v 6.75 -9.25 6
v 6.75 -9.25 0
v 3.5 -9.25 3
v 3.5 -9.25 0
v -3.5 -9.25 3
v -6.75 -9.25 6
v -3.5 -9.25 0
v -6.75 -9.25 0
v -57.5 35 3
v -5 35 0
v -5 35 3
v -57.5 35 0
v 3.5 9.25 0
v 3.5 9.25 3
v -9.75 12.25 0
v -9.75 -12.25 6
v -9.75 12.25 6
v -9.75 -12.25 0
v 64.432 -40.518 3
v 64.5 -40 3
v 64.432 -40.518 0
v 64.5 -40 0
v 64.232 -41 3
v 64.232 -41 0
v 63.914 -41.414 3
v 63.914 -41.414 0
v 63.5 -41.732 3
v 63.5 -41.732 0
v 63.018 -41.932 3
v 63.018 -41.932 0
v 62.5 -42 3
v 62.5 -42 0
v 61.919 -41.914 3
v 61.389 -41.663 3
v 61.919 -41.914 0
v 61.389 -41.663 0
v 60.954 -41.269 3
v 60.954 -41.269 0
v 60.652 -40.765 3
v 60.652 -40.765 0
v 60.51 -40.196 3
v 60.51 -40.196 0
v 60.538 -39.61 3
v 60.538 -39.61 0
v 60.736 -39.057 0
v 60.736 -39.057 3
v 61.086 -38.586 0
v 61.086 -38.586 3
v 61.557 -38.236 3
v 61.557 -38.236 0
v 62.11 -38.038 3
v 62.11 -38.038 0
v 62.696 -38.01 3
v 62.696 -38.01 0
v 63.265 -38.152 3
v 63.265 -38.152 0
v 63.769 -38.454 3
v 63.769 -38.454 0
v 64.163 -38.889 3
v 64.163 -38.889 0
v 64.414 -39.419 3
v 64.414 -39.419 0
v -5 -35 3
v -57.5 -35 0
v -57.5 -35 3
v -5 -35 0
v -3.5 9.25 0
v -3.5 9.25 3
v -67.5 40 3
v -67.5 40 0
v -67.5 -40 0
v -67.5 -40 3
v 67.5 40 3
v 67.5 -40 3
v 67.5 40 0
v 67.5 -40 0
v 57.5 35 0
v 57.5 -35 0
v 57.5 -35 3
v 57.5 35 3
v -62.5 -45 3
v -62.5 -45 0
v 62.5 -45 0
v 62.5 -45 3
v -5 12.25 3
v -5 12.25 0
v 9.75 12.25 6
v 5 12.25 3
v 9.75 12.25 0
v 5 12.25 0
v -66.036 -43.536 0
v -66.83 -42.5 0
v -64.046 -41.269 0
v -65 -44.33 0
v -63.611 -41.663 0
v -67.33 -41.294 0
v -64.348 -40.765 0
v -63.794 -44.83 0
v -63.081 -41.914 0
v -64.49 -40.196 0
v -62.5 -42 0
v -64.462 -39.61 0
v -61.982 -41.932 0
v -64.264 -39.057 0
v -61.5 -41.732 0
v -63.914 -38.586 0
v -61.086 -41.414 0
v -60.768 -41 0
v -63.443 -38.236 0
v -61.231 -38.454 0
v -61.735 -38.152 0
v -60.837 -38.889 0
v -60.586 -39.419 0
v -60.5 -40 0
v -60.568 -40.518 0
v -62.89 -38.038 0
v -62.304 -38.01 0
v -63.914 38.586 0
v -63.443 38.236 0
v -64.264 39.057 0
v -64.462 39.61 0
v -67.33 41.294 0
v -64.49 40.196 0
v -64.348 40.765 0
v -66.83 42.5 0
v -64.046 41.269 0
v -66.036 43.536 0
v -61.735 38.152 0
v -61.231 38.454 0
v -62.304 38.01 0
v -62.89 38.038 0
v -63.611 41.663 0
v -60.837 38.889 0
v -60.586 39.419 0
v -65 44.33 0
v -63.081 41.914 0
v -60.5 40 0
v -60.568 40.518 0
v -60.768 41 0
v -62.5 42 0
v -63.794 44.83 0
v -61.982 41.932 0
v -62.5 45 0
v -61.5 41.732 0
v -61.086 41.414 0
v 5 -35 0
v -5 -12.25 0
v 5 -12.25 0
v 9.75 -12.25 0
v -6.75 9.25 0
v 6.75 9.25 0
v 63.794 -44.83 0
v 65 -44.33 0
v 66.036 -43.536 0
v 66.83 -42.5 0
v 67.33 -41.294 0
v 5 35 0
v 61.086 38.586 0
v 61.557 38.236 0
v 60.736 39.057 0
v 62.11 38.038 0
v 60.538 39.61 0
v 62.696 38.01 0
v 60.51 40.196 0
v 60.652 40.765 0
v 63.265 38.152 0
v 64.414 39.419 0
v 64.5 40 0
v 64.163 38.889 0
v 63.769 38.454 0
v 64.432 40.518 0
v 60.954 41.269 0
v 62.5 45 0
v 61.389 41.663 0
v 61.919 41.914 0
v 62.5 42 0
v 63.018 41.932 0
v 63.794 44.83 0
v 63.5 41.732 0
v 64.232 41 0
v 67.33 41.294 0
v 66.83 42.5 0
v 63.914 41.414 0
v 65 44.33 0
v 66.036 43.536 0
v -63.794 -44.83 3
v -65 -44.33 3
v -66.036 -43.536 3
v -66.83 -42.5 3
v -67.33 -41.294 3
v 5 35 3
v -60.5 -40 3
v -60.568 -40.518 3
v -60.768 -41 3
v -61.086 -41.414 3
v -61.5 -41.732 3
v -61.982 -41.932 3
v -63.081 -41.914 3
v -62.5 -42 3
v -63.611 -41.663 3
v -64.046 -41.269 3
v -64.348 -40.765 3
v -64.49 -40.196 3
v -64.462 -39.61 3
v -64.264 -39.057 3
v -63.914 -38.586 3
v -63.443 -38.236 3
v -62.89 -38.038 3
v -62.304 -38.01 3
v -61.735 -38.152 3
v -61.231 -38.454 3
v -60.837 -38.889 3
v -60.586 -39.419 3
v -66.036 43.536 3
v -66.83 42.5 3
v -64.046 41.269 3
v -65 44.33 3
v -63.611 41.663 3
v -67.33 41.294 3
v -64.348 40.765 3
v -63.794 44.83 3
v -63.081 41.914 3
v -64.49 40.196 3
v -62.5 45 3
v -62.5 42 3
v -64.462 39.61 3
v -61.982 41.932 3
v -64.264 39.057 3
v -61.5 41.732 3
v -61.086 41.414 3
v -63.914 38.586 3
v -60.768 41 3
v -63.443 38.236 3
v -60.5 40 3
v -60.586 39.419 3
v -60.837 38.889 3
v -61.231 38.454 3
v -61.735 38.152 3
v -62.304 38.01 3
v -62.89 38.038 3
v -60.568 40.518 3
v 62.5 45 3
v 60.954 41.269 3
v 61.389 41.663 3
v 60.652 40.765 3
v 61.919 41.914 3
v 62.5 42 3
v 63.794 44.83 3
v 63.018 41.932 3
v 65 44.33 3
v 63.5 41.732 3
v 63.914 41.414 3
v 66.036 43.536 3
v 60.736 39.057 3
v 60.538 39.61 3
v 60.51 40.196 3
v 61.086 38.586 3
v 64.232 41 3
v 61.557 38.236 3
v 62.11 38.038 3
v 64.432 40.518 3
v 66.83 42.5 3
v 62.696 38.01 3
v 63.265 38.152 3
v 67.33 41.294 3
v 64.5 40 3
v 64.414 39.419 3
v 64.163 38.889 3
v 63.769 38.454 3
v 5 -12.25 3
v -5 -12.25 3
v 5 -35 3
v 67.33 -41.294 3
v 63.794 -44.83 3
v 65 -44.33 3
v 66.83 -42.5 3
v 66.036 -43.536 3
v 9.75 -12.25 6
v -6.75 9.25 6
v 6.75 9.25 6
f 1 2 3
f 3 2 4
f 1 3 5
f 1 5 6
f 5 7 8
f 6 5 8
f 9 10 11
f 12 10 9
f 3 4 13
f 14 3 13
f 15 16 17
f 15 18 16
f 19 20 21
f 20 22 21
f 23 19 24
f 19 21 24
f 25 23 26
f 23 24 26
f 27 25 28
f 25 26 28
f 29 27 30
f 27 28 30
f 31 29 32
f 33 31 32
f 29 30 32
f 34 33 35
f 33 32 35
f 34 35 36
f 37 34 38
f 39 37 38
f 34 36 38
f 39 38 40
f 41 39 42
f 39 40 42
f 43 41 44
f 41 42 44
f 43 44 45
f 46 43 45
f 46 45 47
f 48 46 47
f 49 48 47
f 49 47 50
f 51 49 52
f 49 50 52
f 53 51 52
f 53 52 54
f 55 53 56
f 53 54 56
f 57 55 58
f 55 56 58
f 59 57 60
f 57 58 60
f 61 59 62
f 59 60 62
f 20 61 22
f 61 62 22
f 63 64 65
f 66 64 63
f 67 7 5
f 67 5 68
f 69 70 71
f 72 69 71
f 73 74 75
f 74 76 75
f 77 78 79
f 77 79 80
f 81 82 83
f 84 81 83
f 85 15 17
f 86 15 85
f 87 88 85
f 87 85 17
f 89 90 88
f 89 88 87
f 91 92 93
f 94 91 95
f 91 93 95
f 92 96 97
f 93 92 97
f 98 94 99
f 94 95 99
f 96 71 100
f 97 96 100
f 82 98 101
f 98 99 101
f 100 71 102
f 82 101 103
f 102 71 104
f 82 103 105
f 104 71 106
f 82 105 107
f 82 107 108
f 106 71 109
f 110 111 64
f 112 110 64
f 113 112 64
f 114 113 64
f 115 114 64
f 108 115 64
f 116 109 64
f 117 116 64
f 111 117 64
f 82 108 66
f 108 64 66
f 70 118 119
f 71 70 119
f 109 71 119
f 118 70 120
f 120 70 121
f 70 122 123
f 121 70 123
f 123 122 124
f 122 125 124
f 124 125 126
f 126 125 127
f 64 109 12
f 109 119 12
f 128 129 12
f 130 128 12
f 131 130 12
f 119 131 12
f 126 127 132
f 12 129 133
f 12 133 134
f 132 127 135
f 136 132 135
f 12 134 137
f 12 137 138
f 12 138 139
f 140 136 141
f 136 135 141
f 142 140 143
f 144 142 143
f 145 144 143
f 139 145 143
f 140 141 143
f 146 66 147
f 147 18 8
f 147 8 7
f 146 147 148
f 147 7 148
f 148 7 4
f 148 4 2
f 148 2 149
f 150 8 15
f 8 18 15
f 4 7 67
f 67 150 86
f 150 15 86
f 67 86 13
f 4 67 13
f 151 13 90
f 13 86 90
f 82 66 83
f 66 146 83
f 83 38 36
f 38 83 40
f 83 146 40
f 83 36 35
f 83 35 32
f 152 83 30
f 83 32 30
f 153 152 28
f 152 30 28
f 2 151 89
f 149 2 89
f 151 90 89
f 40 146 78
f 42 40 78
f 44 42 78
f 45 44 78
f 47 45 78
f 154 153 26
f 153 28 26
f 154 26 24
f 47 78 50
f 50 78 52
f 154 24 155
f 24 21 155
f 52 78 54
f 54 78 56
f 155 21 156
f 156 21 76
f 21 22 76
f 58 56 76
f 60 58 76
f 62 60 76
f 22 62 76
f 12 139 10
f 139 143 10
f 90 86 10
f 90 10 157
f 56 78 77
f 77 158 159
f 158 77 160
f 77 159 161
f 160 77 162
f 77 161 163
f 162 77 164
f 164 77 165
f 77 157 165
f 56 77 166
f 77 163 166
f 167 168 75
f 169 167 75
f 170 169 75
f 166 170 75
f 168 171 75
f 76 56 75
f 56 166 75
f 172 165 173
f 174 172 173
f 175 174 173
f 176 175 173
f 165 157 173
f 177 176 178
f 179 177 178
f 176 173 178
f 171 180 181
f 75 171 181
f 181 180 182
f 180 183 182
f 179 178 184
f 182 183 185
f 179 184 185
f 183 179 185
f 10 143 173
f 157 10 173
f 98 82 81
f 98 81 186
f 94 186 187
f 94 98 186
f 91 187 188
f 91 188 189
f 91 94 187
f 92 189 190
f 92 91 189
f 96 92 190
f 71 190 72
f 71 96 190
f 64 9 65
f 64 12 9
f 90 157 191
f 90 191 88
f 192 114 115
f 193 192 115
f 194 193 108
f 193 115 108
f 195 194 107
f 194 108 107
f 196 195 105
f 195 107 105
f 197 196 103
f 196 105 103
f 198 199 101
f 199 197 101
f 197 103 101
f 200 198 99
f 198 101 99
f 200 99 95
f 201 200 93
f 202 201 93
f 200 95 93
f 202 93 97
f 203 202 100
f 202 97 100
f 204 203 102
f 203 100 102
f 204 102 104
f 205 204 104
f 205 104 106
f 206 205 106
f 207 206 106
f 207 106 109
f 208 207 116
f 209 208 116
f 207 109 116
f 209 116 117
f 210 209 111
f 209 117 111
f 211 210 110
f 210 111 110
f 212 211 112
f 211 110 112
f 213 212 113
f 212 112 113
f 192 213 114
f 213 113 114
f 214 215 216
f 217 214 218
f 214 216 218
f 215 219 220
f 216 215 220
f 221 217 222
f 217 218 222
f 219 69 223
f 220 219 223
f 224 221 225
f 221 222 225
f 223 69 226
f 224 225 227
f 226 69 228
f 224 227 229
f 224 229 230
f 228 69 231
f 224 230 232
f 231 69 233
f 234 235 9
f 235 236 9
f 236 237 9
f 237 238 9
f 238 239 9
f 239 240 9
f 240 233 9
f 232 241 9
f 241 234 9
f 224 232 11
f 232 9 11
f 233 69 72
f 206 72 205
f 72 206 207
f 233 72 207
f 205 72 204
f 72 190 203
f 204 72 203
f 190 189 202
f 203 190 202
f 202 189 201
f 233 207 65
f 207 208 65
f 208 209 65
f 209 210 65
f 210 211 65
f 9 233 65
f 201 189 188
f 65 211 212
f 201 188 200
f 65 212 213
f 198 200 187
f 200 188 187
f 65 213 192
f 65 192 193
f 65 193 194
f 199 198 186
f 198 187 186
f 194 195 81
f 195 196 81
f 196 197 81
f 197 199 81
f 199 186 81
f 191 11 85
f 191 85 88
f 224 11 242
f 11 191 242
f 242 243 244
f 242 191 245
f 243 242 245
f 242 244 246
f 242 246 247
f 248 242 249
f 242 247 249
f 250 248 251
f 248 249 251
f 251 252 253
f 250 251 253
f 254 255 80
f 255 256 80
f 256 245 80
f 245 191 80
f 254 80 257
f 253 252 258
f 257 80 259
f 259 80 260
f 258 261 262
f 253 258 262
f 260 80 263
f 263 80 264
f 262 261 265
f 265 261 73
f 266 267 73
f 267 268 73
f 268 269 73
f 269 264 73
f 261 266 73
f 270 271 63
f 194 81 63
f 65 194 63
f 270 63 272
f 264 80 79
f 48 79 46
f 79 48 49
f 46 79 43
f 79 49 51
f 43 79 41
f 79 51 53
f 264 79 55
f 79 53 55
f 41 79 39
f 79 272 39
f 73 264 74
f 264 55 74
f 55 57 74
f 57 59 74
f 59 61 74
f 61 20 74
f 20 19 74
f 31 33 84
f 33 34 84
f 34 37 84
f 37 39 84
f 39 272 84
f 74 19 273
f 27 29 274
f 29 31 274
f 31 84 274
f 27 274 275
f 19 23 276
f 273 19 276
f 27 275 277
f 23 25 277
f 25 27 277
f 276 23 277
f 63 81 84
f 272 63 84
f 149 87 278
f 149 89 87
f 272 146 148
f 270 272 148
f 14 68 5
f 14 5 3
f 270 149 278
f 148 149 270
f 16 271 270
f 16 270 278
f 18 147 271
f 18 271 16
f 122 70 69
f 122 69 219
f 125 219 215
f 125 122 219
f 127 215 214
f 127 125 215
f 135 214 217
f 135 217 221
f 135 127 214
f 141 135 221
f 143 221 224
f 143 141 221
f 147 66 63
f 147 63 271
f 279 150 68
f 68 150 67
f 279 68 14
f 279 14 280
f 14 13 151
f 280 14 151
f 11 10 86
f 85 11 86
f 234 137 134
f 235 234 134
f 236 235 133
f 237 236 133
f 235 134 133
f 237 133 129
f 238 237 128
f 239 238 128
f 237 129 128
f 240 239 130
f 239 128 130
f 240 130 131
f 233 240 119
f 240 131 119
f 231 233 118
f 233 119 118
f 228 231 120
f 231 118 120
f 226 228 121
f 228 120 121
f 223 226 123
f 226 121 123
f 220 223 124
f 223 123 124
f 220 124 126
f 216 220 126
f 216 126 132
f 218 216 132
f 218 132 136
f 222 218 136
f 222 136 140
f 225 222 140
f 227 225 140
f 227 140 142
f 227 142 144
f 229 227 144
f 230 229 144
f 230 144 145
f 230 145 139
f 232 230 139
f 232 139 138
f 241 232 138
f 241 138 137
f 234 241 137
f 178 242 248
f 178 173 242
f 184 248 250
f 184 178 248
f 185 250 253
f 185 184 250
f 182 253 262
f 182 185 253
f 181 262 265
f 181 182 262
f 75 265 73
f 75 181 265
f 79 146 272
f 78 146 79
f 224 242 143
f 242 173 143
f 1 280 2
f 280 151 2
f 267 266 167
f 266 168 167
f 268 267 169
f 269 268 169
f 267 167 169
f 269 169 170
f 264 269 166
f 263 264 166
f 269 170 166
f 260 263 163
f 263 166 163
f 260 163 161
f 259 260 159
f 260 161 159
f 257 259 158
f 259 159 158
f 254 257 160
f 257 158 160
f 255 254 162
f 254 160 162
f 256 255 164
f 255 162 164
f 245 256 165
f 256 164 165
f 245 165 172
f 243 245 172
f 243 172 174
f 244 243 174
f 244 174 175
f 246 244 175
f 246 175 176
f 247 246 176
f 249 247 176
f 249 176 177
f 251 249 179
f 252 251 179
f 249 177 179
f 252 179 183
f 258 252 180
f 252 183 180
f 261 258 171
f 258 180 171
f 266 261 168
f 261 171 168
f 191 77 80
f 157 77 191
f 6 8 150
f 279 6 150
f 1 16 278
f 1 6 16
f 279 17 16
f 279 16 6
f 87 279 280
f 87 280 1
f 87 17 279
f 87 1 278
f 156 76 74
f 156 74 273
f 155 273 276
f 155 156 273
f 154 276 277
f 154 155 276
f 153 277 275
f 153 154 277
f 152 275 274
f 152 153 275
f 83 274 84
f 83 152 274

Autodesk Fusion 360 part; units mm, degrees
sketch "Boceto1" plane through (0, 0, 0) normal (0, 0, 1) x (1, 0, 0)
  line L0 (-6.75, 9.25) -> (6.75, 9.25)
  line L1 (6.75, 9.25) -> (6.75, -9.25)
  line L2 (6.75, -9.25) -> (-6.75, -9.25)
  line L3 (-6.75, -9.25) -> (-6.75, 9.25)
  line L4 (-6.75, 9.25) -> (6.75, -9.25) construction
  line L5 (6.75, 9.25) -> (-6.75, -9.25) construction
  line L6 (9.75, -12.25) -> (-9.75, -12.25)
  line L7 (-9.75, -12.25) -> (-9.75, 12.25)
  line L8 (-9.75, 12.25) -> (9.75, 12.25)
  line L9 (9.75, 12.25) -> (9.75, -12.25)
  line L10 (6.75, 0) -> (3.75, 0) construction
  line L11 (-6.75, 0) -> (-3.75, 0) construction
  line L12 (3.5, 0) -> (-3.5, 0)
  line L13 (-3.5, -9.25) -> (-3.5, 9.25)
  line L14 (3.5, -9.25) -> (3.5, 9.25)
  dimension "d1" = 13.5
  dimension "d2" = 18.5
  dimension "d3" = -3
  dimension "d4" = 3
  dimension "d5" = 3
  dimension "d6" = 7
extrude "Extruir1" add sketch "Boceto1" along normal blind 6
extrude "Extruir2" add sketch "Boceto1" along normal blind 3 contours L0 L12 L13 L14 | L2 L12 L13 L14
sketch "Boceto2" plane through (0, 0, 0) normal (0, 0, -1) x (1, 0, 0)
  line L0 (-3.5, -9.25) -> (-6.75, -9.25)
  line L1 (-6.75, -9.25) -> (-6.75, 9.25)
  line L2 (-6.75, 9.25) -> (-3.5, 9.25)
  line L3 (-3.5, 9.25) -> (-3.5, -9.25)
  line L4 (3.5, -9.25) -> (3.5, 9.25)
  line L5 (3.5, 9.25) -> (6.75, 9.25)
  line L6 (6.75, 9.25) -> (6.75, -9.25)
  line L7 (6.75, -9.25) -> (3.5, -9.25)
  line L8 (-9.75, -12.25) -> (9.75, -12.25)
  line L9 (9.75, -12.25) -> (9.75, 12.25)
  line L10 (9.75, 12.25) -> (-9.75, 12.25)
  line L11 (-9.75, 12.25) -> (-9.75, -12.25)
  line L12 (-67.5, 45) -> (67.5, 45)
  line L13 (67.5, 45) -> (67.5, -45)
  line L14 (67.5, -45) -> (-67.5, -45)
  line L15 (-67.5, -45) -> (-67.5, 45)
  line L16 (-67.5, 45) -> (67.5, -45) construction
  line L17 (67.5, 45) -> (-67.5, -45) construction
  line L18 (-67.5, 45) -> (-62.5, 45)
  line L19 (-62.5, 45) -> (-62.5, 40)
  line L20 (-67.5, -45) -> (-62.5, -45)
  line L21 (-62.5, -45) -> (-62.5, -40)
  line L22 (67.5, -45) -> (62.5, -45)
  line L23 (62.5, -45) -> (62.5, -40)
  line L24 (67.5, 45) -> (62.5, 45)
  line L25 (62.5, 45) -> (62.5, 40)
  circle A0 centre (-62.5, 40) radius 2
  circle A1 centre (-62.5, -40) radius 2
  circle A2 centre (62.5, -40) radius 2
  circle A3 centre (62.5, 40) radius 2
  line L26 (0, -12.25) -> (0, -40)
  line L27 (0, 12.25) -> (0, 40)
  line L28 (-62.5, -40) -> (-62.5, 40) construction
  line L29 (62.5, -40) -> (62.5, 40) construction
  circle A4 centre (-62.5, 40) radius 5
  circle A5 centre (62.5, 40) radius 5
  circle A6 centre (-62.5, -40) radius 5
  circle A7 centre (62.5, -40) radius 5
  line L30 (5, -40) -> (-5, -40)
  line L31 (5, 40) -> (-5, 40)
  line L32 (-5, 40) -> (-5, 12.25)
  line L33 (5, 40) -> (5, 12.25)
  line L34 (-5, -40) -> (-5, -12.25)
  line L35 (5, -40) -> (5, -12.25)
  line L36 (-62.5, -45) -> (62.5, -45)
  arc A8 (62.5, -45) -> (62.5, -35) centre (62.5, -40) ccw
  line L37 (62.5, -35) -> (-62.5, -35)
  arc A9 (-62.5, -35) -> (-62.5, -45) centre (-62.5, -40) ccw
  line L38 (-62.5, -40) -> (62.5, -40) construction
  line L39 (-62.5, 35) -> (62.5, 35)
  arc A10 (62.5, 35) -> (62.5, 45) centre (62.5, 40) ccw
  line L40 (62.5, 45) -> (-62.5, 45)
  arc A11 (-62.5, 45) -> (-62.5, 35) centre (-62.5, 40) ccw
  line L41 (-62.5, 40) -> (62.5, 40) construction
  line L42 (-57.5, -40) -> (-57.5, 40)
  arc A12 (-57.5, 40) -> (-67.5, 40) centre (-62.5, 40) ccw
  line L43 (-67.5, 40) -> (-67.5, -40)
  arc A13 (-67.5, -40) -> (-57.5, -40) centre (-62.5, -40) ccw
  line L44 (-62.5, -40) -> (-62.5, 40) construction
  line L45 (67.5, -40) -> (67.5, 40)
  arc A14 (67.5, 40) -> (57.5, 40) centre (62.5, 40) ccw
  line L46 (57.5, 40) -> (57.5, -40)
  arc A15 (57.5, -40) -> (67.5, -40) centre (62.5, -40) ccw
  line L47 (62.5, -40) -> (62.5, 40) construction
  dimension "d11" = 135
  dimension "d12" = 90
  dimension "d13" = 5
  dimension "d14" = 5
  dimension "d15" = 5
  dimension "d16" = 5
  dimension "d17" = 5
  dimension "d18" = 5
  dimension "d19" = 5
  dimension "d20" = 5
  dimension "d21" = 4
  dimension "d22" = 4
  dimension "d23" = 4
  dimension "d24" = 4
  dimension "d25" = 10
  dimension "d26" = 10
  dimension "d27" = 10
  dimension "d28" = 10
  dimension "d29" = 10
  dimension "d30" = 10
  dimension "d31" = 10
  dimension "d32" = 10
extrude "Extruir3" add sketch "Boceto2" against normal blind 3 contours L8 L26 L34 L37 | L8 L26 L35 L37 | L26 L30 L34 L37 | L14 A6 A7 L30 L34 L35 L36 L37 L42 A13 L46 A15 | L10 L27 L32 L39 | L26 L30 L35 L37 | A6 L37 L42 | L15 A4 A6 L37 A9 L39 A11 L42 L43 | L10 L27 L33 L39 | L12 A4 A5 L31 L32 L33 L39 L40 L42 A12 A14 L46 | L27 L31 L32 L39 | A6 A9 A13 | A4 L39 L42 | L27 L31 L33 L39 | L13 A5 A7 A8 L37 L39 A10 L45 L46 | A7 L37 L46 | A4 A11 A12 | A7 A8 A15 | A5 L39 L46 | A5 A10 A14
